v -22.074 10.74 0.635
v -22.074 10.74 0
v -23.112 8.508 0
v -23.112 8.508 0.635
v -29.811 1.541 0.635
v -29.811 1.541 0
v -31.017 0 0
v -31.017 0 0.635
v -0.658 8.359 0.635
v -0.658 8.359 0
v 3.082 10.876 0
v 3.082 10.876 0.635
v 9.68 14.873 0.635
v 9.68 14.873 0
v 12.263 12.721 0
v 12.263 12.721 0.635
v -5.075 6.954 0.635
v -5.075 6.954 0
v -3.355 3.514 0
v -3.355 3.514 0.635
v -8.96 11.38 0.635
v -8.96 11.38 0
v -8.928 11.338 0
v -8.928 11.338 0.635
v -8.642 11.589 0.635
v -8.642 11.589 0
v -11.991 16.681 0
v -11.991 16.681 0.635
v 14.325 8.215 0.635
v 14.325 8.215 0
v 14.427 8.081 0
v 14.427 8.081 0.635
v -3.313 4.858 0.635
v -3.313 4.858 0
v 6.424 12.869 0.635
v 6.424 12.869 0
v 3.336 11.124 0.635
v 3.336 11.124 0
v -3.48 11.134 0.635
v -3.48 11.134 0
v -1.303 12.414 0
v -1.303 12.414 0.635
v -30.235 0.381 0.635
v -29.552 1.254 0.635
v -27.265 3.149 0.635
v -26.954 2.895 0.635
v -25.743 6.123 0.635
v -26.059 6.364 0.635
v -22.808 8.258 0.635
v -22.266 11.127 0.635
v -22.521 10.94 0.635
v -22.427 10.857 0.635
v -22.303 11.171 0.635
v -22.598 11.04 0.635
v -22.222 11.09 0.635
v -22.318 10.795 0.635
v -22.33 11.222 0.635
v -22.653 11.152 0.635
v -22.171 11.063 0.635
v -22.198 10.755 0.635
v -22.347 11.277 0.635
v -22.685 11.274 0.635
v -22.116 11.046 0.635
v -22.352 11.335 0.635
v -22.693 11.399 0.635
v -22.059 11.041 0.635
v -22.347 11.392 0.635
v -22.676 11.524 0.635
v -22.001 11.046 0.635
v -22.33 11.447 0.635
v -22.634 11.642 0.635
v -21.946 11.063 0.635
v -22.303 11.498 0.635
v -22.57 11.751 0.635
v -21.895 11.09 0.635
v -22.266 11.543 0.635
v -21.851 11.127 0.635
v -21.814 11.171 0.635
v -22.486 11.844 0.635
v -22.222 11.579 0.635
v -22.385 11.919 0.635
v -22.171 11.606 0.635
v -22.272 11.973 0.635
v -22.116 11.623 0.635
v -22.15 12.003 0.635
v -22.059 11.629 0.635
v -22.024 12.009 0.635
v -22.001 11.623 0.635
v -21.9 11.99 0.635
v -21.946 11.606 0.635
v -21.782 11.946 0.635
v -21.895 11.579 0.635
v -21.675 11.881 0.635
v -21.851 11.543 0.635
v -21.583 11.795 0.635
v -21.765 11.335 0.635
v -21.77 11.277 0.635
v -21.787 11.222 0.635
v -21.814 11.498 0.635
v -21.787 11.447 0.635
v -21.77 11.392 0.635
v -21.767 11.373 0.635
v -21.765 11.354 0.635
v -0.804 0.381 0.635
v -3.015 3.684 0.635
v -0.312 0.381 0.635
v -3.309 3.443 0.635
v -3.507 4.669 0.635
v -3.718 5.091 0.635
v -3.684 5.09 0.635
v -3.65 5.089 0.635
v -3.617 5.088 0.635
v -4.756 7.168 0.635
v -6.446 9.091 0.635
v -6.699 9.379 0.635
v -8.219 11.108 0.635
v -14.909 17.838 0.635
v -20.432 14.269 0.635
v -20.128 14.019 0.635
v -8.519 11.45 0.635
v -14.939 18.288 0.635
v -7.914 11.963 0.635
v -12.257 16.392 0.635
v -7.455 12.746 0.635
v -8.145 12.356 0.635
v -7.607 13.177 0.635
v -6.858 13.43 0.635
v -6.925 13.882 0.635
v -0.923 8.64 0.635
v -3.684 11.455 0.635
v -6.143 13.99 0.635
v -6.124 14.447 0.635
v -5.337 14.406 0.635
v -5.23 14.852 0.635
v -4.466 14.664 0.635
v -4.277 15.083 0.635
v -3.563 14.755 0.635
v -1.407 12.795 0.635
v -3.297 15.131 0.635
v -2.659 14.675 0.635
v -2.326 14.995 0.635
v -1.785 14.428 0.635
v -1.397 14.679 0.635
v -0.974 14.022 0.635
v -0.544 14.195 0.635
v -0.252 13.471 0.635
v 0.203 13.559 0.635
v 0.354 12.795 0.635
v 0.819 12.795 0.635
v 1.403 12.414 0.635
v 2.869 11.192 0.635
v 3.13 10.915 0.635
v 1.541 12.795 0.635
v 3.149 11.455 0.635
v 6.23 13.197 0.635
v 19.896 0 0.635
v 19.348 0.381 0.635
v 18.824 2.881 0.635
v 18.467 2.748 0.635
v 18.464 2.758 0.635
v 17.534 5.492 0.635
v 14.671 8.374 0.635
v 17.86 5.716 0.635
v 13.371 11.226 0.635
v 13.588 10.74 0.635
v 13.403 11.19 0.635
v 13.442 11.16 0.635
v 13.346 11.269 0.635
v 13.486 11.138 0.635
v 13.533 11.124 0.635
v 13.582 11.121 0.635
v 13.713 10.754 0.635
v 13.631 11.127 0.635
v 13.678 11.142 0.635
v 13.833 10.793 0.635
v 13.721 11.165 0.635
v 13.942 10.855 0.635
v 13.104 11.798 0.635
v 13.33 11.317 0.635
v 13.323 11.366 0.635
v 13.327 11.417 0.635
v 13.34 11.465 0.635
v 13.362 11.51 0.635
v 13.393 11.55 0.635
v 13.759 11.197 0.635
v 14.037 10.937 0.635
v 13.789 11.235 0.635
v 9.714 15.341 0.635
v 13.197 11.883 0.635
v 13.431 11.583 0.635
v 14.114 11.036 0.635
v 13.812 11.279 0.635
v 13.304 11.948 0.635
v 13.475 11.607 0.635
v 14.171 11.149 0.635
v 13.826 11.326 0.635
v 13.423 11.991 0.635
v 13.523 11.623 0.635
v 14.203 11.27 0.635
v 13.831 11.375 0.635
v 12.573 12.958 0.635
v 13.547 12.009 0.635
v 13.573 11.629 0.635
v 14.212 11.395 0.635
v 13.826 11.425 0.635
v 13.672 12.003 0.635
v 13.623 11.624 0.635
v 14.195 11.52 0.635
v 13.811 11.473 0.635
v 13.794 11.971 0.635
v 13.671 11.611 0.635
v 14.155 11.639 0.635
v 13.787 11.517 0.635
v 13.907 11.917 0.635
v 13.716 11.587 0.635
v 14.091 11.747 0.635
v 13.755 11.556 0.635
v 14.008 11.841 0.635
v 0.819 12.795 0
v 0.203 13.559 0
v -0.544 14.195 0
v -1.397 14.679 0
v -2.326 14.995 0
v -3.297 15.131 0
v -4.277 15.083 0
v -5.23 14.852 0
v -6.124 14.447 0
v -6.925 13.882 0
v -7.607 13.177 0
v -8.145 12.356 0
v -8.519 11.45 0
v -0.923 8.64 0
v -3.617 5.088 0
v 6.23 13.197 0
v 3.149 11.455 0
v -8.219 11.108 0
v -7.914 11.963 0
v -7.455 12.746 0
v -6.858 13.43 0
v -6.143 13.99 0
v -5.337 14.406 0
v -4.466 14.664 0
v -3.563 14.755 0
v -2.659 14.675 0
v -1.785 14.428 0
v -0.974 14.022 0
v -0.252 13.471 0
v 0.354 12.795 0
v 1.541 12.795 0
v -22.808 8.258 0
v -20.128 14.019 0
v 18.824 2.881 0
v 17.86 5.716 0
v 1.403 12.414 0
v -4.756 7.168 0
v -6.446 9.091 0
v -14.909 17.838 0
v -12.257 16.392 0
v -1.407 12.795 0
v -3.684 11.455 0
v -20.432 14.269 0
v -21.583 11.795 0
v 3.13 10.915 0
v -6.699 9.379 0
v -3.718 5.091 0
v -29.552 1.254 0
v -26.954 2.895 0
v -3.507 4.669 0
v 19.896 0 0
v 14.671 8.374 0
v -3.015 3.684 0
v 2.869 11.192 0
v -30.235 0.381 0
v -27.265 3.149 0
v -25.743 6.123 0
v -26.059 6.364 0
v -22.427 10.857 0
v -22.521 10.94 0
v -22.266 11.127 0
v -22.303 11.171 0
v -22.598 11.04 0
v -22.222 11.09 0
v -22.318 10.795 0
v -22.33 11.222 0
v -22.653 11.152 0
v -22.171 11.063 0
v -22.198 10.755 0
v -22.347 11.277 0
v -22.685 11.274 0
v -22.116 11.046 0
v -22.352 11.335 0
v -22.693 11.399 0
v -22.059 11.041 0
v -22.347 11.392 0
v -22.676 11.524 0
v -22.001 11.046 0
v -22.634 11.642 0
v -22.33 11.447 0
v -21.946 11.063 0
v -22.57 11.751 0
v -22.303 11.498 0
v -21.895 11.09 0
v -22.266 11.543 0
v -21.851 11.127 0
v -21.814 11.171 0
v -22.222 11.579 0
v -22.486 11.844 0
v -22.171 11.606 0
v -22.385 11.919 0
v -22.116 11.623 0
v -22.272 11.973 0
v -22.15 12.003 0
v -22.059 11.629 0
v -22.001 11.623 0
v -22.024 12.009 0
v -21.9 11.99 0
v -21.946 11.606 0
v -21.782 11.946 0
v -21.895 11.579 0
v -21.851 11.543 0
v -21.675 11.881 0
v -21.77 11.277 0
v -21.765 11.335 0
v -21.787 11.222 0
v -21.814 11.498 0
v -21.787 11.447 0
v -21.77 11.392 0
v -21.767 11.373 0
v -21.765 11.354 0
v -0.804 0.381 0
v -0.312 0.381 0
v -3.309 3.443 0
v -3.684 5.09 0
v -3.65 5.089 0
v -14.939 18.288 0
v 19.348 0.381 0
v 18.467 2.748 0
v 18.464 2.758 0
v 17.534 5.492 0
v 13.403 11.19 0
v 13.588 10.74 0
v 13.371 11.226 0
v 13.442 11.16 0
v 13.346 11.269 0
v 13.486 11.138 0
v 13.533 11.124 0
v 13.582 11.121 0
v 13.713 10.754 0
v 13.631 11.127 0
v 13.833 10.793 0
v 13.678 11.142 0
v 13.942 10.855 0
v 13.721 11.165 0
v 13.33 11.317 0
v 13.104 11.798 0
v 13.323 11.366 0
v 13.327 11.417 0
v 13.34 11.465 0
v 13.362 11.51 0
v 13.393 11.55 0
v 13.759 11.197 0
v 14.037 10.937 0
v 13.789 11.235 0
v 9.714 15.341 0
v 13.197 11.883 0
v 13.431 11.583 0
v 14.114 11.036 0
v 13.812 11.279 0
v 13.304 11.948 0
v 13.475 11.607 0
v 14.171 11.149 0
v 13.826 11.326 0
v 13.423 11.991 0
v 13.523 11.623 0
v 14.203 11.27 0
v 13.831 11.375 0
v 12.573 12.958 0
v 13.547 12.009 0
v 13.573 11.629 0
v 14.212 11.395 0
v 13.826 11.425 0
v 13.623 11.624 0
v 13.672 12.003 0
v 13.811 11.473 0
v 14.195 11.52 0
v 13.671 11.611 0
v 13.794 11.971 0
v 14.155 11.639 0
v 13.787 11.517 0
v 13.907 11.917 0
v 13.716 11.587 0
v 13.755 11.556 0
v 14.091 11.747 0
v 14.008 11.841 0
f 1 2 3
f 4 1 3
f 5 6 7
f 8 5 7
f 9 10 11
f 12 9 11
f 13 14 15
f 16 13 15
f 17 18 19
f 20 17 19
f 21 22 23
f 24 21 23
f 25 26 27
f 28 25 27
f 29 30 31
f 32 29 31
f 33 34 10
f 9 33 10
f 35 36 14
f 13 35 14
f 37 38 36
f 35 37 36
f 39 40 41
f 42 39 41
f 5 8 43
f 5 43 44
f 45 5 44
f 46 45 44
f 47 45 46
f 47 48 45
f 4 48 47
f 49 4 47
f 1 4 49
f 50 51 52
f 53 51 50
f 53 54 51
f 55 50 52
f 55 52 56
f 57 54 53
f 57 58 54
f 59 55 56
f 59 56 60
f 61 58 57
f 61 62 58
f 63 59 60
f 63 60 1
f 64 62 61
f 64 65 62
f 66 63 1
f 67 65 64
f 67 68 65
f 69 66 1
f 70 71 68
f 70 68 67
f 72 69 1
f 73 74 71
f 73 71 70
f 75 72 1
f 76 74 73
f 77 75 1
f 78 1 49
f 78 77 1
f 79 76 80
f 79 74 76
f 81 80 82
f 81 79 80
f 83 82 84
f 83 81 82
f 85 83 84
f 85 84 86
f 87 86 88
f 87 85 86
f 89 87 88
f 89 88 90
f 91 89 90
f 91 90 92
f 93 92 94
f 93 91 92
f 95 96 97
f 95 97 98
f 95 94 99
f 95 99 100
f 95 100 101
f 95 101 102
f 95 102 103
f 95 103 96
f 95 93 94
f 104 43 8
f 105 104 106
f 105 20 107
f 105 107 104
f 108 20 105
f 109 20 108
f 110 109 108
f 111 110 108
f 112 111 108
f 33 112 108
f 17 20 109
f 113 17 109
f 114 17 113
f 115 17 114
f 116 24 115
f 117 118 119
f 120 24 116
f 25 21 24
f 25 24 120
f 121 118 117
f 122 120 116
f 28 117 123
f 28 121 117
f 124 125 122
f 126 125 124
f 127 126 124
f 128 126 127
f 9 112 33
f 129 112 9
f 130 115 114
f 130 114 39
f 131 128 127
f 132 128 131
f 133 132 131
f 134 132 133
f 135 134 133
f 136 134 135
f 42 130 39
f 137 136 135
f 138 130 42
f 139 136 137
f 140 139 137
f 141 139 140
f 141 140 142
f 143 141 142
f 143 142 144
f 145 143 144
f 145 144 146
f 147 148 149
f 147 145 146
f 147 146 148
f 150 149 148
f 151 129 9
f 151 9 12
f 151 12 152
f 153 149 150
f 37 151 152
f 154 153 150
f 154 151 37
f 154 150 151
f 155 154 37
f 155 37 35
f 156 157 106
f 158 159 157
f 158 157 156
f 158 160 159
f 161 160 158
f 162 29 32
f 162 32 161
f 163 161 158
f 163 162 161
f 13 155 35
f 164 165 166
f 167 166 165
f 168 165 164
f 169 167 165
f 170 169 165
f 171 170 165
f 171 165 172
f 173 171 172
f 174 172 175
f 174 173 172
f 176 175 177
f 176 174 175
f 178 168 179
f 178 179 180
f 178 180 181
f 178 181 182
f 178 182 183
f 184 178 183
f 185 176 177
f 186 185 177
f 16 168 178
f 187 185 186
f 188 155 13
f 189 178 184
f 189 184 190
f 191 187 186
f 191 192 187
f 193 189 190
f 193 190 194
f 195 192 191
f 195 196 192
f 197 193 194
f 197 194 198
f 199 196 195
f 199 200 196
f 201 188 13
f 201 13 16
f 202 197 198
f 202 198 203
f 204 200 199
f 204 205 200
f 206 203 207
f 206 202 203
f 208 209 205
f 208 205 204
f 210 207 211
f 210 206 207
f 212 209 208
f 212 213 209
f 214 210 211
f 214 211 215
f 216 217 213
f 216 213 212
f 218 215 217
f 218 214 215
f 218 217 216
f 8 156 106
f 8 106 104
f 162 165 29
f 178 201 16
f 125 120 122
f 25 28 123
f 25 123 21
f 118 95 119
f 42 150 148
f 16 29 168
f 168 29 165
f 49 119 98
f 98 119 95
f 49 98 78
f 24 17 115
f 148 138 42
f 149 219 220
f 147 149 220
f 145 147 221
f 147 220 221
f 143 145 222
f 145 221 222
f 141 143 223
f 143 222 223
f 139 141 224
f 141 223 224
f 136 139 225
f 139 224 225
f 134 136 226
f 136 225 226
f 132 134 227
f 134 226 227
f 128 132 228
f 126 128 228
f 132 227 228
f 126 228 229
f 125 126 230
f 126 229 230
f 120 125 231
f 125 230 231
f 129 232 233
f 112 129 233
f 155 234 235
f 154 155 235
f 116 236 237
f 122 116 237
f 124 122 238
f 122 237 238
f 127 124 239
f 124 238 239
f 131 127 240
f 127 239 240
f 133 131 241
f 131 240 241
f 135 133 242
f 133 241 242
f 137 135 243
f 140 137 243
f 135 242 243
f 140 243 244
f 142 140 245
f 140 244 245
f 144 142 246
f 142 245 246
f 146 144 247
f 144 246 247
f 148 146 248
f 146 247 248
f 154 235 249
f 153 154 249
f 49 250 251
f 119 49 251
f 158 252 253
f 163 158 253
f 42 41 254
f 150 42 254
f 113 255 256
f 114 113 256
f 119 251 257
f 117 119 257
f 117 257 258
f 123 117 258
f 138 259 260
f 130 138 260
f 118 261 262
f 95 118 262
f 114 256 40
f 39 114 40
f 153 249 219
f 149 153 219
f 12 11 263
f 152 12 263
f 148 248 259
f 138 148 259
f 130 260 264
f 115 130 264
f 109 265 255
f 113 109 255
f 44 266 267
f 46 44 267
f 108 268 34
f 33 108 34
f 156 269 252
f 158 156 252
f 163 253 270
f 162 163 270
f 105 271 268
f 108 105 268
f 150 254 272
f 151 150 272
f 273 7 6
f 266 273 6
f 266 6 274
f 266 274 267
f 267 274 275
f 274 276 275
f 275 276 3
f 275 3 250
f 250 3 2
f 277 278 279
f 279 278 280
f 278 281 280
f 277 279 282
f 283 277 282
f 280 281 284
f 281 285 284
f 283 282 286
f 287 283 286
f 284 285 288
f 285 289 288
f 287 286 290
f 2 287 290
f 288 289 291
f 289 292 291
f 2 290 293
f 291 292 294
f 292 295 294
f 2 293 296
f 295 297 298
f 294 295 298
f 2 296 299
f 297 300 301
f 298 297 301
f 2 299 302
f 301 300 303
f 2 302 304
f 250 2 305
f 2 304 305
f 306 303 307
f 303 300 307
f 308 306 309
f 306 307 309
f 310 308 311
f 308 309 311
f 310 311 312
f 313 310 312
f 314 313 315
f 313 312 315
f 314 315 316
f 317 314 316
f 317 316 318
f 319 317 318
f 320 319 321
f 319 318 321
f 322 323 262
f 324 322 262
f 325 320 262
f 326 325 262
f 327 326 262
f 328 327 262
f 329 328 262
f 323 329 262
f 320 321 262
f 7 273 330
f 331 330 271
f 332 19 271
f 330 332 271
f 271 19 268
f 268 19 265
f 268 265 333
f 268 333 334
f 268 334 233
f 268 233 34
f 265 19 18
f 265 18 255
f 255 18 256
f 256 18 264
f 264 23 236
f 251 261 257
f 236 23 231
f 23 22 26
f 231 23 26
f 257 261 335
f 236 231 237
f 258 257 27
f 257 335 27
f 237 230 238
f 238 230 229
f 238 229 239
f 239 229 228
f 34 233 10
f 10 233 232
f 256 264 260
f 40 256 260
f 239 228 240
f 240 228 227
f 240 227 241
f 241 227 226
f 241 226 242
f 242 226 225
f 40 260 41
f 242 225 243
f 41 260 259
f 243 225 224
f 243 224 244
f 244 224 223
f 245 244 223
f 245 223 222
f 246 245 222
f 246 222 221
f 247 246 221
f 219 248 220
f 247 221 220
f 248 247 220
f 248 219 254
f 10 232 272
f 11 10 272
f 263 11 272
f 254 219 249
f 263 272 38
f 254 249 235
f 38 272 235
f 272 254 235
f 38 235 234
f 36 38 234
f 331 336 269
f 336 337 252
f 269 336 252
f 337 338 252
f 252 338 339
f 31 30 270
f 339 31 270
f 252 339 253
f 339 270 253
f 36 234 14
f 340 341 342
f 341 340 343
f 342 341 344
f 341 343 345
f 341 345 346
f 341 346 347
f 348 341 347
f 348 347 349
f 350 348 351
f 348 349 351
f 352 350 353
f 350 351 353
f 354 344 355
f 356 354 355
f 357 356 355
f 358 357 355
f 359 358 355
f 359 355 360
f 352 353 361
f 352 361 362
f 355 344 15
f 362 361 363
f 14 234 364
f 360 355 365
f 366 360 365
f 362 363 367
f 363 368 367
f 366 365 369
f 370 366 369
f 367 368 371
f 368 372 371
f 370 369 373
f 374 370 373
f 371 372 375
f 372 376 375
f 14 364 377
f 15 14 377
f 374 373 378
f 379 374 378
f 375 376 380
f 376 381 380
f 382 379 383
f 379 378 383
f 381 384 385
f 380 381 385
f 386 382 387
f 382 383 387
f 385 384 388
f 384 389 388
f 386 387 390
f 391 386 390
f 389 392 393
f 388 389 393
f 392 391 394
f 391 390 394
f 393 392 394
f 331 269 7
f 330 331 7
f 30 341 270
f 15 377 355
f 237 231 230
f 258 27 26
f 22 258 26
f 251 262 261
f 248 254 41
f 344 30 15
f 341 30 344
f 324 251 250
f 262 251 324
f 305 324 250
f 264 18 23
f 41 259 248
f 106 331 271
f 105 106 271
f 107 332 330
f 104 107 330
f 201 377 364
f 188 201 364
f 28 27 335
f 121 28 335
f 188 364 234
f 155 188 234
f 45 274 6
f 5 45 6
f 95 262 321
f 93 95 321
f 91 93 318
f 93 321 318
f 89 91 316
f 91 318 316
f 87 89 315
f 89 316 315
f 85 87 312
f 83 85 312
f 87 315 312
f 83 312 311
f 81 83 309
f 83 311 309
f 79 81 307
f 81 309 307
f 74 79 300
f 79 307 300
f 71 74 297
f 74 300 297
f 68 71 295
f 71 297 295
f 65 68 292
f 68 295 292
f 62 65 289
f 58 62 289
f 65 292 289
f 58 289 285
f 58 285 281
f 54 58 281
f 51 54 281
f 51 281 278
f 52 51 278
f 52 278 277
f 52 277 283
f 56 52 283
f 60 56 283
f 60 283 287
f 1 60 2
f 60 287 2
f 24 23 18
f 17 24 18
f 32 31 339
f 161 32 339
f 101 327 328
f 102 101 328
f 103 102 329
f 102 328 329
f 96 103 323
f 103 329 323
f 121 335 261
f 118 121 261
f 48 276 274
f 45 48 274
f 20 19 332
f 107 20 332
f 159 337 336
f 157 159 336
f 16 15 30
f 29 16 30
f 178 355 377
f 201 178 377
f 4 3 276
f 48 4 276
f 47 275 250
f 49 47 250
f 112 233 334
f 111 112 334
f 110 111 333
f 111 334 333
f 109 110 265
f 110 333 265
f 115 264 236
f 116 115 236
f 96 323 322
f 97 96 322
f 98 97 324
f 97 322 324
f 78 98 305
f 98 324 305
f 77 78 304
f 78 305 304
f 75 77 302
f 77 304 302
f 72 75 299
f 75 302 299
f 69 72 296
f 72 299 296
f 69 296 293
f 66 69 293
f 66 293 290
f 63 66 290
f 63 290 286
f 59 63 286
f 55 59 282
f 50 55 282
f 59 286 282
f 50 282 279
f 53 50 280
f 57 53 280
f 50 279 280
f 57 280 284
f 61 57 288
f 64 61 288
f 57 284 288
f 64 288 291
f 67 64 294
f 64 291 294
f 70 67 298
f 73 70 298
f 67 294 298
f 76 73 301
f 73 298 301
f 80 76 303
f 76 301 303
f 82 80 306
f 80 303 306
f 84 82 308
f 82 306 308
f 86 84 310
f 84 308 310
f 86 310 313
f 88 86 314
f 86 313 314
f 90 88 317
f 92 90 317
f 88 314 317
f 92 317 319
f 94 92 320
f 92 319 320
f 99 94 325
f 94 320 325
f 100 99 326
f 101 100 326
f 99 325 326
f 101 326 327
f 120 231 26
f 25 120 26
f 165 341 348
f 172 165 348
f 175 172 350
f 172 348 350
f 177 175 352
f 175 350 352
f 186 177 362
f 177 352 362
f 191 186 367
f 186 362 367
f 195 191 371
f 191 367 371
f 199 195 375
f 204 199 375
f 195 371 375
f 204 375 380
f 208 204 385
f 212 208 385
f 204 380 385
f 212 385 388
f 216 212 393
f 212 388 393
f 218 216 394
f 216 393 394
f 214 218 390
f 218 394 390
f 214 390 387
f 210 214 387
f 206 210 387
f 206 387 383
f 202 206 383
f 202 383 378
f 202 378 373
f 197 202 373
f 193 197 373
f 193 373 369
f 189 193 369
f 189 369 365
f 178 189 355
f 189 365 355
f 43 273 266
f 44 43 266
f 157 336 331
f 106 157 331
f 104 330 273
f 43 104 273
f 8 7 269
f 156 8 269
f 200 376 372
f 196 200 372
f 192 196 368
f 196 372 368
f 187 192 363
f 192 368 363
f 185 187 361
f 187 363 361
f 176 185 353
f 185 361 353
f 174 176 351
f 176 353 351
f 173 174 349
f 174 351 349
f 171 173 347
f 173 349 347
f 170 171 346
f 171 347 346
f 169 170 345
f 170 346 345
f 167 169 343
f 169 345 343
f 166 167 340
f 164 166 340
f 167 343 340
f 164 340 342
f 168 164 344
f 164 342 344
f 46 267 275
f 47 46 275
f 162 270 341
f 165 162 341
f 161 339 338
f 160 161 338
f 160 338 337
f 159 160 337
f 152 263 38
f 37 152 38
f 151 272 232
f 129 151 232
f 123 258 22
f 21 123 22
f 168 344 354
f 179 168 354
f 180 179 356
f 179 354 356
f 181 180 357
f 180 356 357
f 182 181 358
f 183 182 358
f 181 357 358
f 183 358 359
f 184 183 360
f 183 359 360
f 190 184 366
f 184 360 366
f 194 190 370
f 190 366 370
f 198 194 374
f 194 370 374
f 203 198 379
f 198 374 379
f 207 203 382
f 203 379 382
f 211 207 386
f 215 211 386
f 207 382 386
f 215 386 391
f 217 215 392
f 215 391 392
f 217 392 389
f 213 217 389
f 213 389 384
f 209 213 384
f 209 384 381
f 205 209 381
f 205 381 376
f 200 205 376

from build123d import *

# Parameters (mm, degrees)
F1_DEPTH = 0.635


with BuildPart() as f1:
    # F0 (on Top) → F1 (new body)
    with BuildSketch(Plane.XY):
        with BuildLine():
            Line((-29.810913, 1.540789), (-31.016748, 0))
            Line((-31.016748, 0), (19.896272, 0))
            Line((19.896272, 0), (18.82442, 2.880605))
            Line((18.82442, 2.880605), (17.860188, 5.716184))
            Line((17.860188, 5.716184), (14.670988, 8.373851))
            Line((14.670988, 8.373851), (13.588352, 10.739779))
            ThreePointArc((13.588352, 10.739779), (14.154572, 11.638903), (13.104023, 11.798203))
            Line((13.104023, 11.798203), (12.573407, 12.957779))
            Line((12.573407, 12.957779), (9.713667, 15.340896))
            Line((9.713667, 15.340896), (6.230144, 13.197191))
            Line((6.230144, 13.197191), (3.148568, 11.455429))
            Line((3.148568, 11.455429), (1.540788, 12.795246))
            Line((1.540788, 12.795246), (0.818556, 12.795246))
            ThreePointArc((0.818556, 12.795246), (-4.276831, 15.082857), (-8.518913, 11.449555))
            Line((-8.518913, 11.449555), (-8.641816, 11.589411))
            Line((-8.641816, 11.589411), (-11.991355, 16.680711))
            Line((-11.991355, 16.680711), (-14.938951, 18.288492))
            Line((-14.938951, 18.288492), (-20.432198, 14.269044))
            Line((-20.432198, 14.269044), (-21.582795, 11.795261))
            ThreePointArc((-21.582795, 11.795261), (-22.634312, 11.642479), (-22.073679, 10.739861))
            Line((-22.073679, 10.739861), (-23.11183, 8.507834))
            Line((-23.11183, 8.507834), (-26.059426, 6.364127))
            Line((-26.059426, 6.364127), (-27.265261, 3.148568))
            Line((-27.265261, 3.148568), (-29.810913, 1.540789))
        make_face()
        Polygon((-25.742841, 6.123265), (-22.807967, 8.25772), (-20.128087, 14.019463), (-14.909113, 17.838224), (-12.257344, 16.391804), (-8.96011, 11.380007), (-8.92801, 11.337907), (-5.075081, 6.95354), (-3.355364, 3.514106), (-3.309465, 3.443231), (-0.804003, 0.381), (-30.234767, 0.381), (-29.551596, 1.253941), (-26.9535, 2.894843), align=None, mode=Mode.SUBTRACT)
        with BuildLine():
            Line((-3.717773, 5.090865), (-4.756348, 7.168017))
            Line((-4.756348, 7.168017), (-6.445825, 9.090525))
            Line((-6.445825, 9.090525), (-3.479574, 11.133942))
            Line((-3.479574, 11.133942), (-1.303058, 12.414246))
            Line((-1.303058, 12.414246), (1.402847, 12.414246))
            Line((1.402847, 12.414246), (2.869082, 11.192383))
            Line((2.869082, 11.192383), (-0.923488, 8.639836))
            Line((-0.923488, 8.639836), (-3.616762, 5.088058))
            ThreePointArc((-3.616762, 5.088058), (-3.667275, 5.089198), (-3.717773, 5.090865))
        make_face(mode=Mode.SUBTRACT)
        Polygon((-0.311727, 0.381), (-3.014587, 3.684495), (-3.506604, 4.668528), (-3.313175, 4.85785), (-0.658187, 8.359138), (3.081815, 10.876305), (3.130206, 10.914939), (3.336041, 11.123745), (6.423789, 12.868994), (9.680128, 14.872894), (12.262983, 12.720515), (14.324537, 8.215317), (14.427077, 8.081159), (17.533967, 5.492083), (18.463705, 2.757945), (18.467338, 2.747738), (19.347984, 0.381), align=None, mode=Mode.SUBTRACT)
        with BuildLine():
            ThreePointArc((-21.770268, 11.392193), (-21.766019, 11.363603), (-21.764598, 11.334734))
            ThreePointArc((-21.764598, 11.334734), (-22.351069, 11.305865), (-21.770268, 11.392193))
        make_face(mode=Mode.SUBTRACT)
        with BuildLine():
            Line((-3.684495, 11.455429), (-6.699082, 9.378714))
            Line((-6.699082, 9.378714), (-8.218903, 11.108165))
            ThreePointArc((-8.218903, 11.108165), (-4.466352, 14.664212), (0.353822, 12.795246))
            Line((0.353822, 12.795246), (-1.406807, 12.795246))
            Line((-1.406807, 12.795246), (-3.684495, 11.455429))
        make_face(mode=Mode.SUBTRACT)
        with BuildLine():
            ThreePointArc((13.831154, 11.37468), (13.631239, 11.126505), (13.346187, 11.268991))
            ThreePointArc((13.346187, 11.268991), (13.523069, 11.622855), (13.831154, 11.37468))
        make_face(mode=Mode.SUBTRACT)
    extrude(amount=F1_DEPTH)


solid = f1.part
